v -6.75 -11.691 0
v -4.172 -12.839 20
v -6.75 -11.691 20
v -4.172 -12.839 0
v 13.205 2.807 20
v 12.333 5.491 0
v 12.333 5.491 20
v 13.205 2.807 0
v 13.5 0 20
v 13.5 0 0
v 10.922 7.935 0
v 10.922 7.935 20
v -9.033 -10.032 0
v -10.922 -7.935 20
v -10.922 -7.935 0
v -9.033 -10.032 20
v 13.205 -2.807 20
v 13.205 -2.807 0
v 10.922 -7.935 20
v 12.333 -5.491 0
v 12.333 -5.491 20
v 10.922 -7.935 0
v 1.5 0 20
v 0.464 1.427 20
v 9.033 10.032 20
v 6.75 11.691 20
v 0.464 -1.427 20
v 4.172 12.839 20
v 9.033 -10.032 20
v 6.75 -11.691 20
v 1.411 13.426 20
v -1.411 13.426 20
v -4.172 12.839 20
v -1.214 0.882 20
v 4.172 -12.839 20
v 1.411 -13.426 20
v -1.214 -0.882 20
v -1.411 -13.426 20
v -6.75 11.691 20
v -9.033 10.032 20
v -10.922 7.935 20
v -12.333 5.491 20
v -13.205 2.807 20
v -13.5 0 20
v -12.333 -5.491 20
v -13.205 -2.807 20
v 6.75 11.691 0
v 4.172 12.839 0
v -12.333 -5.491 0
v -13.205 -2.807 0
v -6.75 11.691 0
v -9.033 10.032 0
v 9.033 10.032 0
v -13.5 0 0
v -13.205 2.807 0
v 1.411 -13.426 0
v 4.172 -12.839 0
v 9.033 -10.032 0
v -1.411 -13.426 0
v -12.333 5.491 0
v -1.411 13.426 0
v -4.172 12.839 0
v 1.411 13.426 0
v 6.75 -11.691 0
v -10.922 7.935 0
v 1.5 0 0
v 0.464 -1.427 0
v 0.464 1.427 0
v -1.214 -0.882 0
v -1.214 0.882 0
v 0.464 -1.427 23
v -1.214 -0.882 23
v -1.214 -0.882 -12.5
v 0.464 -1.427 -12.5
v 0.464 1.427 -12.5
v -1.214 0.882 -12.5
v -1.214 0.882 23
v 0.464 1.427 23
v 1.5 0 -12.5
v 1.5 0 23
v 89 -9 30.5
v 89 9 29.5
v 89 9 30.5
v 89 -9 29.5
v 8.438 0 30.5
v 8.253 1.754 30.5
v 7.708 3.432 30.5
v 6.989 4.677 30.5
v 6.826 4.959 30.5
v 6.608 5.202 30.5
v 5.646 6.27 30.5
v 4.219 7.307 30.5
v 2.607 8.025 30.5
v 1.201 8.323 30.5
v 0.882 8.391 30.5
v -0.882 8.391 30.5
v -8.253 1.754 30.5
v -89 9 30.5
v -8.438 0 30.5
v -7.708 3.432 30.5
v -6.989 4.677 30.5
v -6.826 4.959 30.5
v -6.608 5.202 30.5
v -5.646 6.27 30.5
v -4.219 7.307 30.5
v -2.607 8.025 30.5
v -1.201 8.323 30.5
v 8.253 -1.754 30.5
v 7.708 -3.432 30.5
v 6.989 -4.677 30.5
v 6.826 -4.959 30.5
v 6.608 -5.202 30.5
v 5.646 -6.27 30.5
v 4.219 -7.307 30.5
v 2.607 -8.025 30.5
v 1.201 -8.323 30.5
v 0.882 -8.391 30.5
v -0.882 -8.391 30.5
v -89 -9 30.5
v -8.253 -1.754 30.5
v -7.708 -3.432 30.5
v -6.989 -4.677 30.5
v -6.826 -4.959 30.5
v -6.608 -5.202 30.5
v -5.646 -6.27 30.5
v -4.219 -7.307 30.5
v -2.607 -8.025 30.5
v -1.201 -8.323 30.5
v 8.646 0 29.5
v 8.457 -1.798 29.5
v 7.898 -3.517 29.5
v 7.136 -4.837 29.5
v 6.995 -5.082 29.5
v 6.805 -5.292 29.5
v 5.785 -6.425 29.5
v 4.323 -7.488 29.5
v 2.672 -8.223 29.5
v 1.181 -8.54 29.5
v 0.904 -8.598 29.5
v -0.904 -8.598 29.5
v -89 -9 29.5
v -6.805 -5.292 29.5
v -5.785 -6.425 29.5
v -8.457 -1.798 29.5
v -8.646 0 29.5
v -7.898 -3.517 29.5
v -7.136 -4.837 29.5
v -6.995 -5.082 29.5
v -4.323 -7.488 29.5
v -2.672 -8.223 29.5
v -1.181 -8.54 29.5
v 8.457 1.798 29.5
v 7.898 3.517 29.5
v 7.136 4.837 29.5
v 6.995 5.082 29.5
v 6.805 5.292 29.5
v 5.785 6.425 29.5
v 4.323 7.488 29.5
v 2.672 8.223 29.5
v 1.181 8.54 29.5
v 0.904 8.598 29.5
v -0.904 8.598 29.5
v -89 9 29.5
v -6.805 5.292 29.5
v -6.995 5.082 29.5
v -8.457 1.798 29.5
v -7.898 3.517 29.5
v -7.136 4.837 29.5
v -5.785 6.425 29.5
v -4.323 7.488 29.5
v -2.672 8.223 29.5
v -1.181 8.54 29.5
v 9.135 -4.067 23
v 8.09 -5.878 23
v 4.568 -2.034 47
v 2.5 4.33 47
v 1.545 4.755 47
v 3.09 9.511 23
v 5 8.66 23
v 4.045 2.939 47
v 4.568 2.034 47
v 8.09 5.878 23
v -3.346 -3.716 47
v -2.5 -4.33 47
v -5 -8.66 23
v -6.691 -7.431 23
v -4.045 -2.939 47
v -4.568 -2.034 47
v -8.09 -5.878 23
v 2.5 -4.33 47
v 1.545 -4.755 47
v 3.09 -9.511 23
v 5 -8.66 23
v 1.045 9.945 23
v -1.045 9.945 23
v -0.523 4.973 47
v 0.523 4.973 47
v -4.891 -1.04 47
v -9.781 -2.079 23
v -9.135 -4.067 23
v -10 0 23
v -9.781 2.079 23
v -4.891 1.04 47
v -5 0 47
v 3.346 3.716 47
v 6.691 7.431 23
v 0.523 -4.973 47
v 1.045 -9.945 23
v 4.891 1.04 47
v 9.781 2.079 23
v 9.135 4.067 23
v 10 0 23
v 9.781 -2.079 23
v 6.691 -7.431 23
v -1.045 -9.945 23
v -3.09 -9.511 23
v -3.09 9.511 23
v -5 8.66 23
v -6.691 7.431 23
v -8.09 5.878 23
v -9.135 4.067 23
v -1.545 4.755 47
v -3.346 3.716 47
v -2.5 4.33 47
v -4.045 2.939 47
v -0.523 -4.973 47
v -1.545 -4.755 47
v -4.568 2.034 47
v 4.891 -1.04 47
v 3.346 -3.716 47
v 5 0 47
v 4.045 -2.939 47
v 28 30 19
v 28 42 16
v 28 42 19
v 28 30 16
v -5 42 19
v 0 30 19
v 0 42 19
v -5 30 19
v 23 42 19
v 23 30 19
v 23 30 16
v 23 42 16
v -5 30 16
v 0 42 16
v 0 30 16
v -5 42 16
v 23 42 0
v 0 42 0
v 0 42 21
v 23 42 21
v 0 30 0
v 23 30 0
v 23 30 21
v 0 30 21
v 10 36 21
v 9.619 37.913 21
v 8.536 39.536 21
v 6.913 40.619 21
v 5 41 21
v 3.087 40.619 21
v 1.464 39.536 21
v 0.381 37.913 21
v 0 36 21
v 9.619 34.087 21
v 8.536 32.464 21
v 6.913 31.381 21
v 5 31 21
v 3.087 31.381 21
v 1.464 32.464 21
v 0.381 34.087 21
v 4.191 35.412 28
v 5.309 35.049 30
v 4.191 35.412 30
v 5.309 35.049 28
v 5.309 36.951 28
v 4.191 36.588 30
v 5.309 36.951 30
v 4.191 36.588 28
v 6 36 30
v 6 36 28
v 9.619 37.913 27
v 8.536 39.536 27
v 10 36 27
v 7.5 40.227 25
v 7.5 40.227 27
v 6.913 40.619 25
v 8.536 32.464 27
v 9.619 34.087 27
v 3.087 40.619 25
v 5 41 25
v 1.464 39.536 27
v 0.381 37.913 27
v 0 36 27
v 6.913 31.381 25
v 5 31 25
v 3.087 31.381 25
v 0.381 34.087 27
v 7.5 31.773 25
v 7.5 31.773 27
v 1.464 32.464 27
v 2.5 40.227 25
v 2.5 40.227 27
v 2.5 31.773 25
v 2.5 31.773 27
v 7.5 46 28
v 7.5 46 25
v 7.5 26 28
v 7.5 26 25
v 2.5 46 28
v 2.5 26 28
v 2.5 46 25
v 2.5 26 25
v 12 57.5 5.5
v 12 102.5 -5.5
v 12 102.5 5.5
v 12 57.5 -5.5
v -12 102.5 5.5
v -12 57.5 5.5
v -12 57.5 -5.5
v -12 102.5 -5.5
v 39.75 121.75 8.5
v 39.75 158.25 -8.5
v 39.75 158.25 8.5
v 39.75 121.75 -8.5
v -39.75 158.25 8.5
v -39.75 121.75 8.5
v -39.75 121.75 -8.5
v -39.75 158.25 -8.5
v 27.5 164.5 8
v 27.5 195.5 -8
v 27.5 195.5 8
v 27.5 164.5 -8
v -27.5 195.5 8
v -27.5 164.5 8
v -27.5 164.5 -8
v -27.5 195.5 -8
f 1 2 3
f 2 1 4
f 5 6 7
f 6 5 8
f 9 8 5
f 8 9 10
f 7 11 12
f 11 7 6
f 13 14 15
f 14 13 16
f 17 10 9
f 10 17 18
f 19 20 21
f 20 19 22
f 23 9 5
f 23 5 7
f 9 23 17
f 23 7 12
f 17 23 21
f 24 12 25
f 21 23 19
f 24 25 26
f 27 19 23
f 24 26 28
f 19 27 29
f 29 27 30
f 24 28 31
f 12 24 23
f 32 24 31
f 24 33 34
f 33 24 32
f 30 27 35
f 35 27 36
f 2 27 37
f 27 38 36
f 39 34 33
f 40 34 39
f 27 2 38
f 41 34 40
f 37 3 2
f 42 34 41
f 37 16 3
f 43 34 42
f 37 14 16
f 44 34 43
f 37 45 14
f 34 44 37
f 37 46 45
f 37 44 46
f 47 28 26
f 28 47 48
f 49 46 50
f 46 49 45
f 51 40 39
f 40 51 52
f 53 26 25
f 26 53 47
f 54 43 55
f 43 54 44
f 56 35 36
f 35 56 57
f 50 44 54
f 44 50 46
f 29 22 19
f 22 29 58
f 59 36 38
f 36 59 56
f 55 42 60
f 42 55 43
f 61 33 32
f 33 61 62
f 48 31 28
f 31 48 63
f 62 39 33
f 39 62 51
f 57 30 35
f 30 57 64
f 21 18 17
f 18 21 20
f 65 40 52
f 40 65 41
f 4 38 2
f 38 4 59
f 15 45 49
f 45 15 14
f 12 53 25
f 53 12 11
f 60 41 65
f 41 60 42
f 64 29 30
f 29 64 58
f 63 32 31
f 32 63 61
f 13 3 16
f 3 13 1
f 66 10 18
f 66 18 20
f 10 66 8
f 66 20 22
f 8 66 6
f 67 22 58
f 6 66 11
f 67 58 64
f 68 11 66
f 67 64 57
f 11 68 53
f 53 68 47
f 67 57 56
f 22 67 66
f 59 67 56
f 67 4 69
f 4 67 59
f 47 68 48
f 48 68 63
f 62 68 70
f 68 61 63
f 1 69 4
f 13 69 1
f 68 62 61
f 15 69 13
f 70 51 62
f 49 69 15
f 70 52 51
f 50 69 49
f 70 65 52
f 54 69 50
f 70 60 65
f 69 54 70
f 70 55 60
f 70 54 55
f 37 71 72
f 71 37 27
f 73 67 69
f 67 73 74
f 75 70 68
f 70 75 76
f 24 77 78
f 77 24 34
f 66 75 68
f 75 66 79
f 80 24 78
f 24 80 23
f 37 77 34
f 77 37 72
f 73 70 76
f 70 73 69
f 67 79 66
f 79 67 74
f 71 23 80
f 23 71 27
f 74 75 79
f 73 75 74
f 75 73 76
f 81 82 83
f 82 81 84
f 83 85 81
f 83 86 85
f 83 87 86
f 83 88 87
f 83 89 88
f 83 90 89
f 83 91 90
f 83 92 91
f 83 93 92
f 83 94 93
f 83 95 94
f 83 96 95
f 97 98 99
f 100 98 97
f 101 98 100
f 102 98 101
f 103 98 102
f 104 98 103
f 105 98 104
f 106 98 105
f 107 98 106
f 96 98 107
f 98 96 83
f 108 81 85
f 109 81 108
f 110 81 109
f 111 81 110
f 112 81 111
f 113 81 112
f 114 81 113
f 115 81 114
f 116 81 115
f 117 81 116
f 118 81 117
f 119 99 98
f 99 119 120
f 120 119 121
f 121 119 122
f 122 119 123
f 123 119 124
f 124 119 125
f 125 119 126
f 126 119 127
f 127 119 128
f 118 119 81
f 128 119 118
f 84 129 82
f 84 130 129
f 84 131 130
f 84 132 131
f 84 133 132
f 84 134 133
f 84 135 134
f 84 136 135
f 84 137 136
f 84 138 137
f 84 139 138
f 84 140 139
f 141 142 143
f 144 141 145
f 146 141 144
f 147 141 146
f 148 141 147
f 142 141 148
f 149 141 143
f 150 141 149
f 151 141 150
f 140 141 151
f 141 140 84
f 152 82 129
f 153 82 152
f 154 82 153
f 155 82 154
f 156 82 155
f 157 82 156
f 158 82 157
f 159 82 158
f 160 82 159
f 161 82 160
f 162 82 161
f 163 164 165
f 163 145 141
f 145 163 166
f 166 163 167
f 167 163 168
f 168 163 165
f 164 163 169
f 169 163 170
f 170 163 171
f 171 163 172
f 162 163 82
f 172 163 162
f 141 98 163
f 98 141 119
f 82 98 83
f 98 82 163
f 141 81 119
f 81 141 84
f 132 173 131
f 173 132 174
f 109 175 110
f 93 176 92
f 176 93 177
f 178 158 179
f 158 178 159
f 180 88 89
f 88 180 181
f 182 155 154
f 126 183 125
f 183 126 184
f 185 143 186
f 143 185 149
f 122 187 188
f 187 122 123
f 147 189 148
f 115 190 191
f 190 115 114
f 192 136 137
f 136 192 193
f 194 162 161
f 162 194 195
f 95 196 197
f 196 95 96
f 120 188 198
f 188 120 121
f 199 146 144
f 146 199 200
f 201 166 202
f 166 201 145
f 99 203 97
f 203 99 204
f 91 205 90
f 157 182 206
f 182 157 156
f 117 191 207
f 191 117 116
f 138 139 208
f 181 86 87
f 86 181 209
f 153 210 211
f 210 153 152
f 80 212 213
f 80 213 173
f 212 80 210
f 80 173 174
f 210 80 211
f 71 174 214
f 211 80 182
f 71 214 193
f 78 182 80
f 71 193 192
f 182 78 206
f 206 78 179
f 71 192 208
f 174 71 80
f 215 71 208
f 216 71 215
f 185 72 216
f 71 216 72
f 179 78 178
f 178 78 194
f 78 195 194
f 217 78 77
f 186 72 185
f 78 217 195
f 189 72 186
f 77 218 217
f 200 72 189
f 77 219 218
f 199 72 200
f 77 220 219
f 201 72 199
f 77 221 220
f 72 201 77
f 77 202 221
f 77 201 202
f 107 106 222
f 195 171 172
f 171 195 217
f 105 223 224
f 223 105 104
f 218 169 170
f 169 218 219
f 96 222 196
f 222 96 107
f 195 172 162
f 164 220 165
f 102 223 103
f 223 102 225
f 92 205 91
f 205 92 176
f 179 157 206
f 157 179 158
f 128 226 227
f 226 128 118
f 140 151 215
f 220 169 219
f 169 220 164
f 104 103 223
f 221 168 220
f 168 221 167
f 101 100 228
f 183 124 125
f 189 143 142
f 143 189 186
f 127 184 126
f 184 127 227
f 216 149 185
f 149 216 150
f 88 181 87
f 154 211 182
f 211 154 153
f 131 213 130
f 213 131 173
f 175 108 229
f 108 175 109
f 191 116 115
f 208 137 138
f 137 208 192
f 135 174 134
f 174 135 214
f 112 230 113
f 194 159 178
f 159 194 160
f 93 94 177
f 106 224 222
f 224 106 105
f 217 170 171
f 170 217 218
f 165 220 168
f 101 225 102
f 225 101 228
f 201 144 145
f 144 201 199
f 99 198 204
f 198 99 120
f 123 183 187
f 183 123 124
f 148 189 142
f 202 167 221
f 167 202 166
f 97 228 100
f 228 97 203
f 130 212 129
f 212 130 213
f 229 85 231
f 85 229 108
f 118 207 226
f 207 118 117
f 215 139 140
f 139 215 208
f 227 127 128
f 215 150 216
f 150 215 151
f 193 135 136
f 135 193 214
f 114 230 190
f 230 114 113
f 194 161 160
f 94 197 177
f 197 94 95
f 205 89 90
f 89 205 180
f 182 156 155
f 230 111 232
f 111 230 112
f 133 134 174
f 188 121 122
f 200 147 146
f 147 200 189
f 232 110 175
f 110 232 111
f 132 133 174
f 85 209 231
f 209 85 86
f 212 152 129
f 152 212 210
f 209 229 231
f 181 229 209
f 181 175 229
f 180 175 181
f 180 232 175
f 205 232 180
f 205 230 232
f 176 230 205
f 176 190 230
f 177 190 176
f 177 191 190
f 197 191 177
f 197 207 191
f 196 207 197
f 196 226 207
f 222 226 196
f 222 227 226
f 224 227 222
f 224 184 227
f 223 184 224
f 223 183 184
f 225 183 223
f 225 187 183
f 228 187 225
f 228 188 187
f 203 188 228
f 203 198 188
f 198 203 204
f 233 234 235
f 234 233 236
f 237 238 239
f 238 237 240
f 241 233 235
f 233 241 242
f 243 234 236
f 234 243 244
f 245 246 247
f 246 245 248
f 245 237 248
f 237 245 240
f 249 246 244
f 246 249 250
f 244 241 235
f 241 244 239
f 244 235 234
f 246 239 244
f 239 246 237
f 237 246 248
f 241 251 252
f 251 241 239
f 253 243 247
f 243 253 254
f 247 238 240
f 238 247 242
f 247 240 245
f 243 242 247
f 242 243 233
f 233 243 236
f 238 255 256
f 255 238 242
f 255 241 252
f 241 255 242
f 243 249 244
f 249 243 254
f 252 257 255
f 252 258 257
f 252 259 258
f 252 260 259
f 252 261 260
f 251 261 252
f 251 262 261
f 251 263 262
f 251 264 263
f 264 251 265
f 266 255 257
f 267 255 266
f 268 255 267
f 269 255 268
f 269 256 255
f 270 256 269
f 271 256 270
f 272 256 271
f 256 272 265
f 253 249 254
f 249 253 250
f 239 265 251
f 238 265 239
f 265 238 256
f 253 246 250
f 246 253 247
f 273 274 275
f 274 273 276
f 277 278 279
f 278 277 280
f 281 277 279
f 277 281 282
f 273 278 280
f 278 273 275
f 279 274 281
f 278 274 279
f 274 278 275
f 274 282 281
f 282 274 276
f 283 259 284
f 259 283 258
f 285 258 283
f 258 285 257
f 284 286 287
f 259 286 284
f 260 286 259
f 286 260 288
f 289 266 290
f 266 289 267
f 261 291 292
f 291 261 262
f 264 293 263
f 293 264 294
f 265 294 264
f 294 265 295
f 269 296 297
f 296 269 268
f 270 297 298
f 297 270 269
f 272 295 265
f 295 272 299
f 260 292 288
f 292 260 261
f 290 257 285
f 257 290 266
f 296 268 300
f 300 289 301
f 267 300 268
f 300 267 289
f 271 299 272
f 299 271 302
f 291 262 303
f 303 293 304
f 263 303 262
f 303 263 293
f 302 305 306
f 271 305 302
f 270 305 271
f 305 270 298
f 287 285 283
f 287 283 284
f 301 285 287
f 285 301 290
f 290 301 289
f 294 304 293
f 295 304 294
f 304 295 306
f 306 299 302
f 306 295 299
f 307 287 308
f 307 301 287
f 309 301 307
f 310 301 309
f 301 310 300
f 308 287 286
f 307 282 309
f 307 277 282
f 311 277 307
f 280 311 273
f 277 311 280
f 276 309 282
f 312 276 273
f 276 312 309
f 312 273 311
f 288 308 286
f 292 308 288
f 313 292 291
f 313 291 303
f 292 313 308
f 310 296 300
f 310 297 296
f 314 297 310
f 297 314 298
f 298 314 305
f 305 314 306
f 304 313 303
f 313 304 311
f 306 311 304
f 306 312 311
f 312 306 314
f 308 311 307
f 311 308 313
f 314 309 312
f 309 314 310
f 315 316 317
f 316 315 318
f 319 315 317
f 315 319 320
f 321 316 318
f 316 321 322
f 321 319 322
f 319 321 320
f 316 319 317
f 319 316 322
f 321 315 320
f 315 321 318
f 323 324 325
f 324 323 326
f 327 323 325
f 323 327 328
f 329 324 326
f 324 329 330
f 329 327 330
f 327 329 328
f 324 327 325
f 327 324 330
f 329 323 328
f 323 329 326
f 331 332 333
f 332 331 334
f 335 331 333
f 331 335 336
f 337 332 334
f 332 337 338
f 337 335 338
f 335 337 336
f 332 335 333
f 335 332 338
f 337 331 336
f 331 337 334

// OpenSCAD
module motor(){
/* 2725 Brushless Outrunner Motor 1600kv
Specs:
Dimensions: 27mm x 25mm
Weight: 35g
KV: 1600 rpm/v
Voltage: 7.4v~11.1v (2s~3s)
Max Current: 17A
Max Power: 190w
Shaft: 3mm
*/
cylinder(r=13.5, h=20,center=true);
cylinder(r=1.5, h=45, center=true);
}

module speedController(){
/*
Cont Current: 18A Burst Current: 22A BEC Mode: Linear BEC : 5v / 2A
Lipo Cells: 2-4
NiMH : 5-12
Weight: 19g Size: 24x45x11mm 
*/
cube([24,45,11], center = true);
}

module lipo1000(){
/* Minimum Capacity: 1000mAh Configuration: 3S1P / 11.1v / 3Cell Constant Discharge: 20C Peak Discharge (10sec): 30C Pack Weight: 87g Pack Size: 79.5 x 36.5 x 17mm Charge Plug: JST-XH
*/
cube([79.5,36.5,17], center = true);
}

module lipo610(){
/* Capacity : 610mAh Constant discharge: 20C Burst rate: 30C (15sec) Configuration : 3S 11.1v Pack size: 55x31x16mm Weight : 50.9g
*/
cube([55,31,16], center = true);
}

module propeller(){
/* 178x102mm */
cube([178,18,1], center = true);
}

module propellerAdapter(){
/* Propeller Adapter (Colet Type) 3MM Spec:
Motor Shaft: 3mm
Prop Shaft: 6mm
Prop Shaft length: 24mm
Weight: 13.2 grams */
cylinder(r1=10, r2=5, h=24, center=true);
}
module servoMotor(){
/* Spec.
Dimension: 23x12.2x29mm
Torque: 1.5kg/cm (4.8V)
Operating speed: 0.10sec/60 degree
Operating voltage: 4.8V
Temperature range: 0-55C
Dead band-width: 7us */
translate([-5,0,16]) cube([33,12,3], center=false);
cube([23,12,21], center=false);
translate([5,6,0]) cylinder(r=1, h=30, center=false);
translate([5,6,0]) cylinder(r=5, h=27, center=false);
translate([2.5,-4,25]) cube([5,20,3], center=false);
}

module propellerMotor(){
translate([0,0,30]) propeller();
translate([0,0,35]) propellerAdapter();
translate([0,0,10]) motor();
}

propellerMotor();
translate([0,30,0]) servoMotor();
translate([0,80,0]) speedController();
translate([0,140,0]) lipo1000();

translate([0,180,0]) lipo610();
